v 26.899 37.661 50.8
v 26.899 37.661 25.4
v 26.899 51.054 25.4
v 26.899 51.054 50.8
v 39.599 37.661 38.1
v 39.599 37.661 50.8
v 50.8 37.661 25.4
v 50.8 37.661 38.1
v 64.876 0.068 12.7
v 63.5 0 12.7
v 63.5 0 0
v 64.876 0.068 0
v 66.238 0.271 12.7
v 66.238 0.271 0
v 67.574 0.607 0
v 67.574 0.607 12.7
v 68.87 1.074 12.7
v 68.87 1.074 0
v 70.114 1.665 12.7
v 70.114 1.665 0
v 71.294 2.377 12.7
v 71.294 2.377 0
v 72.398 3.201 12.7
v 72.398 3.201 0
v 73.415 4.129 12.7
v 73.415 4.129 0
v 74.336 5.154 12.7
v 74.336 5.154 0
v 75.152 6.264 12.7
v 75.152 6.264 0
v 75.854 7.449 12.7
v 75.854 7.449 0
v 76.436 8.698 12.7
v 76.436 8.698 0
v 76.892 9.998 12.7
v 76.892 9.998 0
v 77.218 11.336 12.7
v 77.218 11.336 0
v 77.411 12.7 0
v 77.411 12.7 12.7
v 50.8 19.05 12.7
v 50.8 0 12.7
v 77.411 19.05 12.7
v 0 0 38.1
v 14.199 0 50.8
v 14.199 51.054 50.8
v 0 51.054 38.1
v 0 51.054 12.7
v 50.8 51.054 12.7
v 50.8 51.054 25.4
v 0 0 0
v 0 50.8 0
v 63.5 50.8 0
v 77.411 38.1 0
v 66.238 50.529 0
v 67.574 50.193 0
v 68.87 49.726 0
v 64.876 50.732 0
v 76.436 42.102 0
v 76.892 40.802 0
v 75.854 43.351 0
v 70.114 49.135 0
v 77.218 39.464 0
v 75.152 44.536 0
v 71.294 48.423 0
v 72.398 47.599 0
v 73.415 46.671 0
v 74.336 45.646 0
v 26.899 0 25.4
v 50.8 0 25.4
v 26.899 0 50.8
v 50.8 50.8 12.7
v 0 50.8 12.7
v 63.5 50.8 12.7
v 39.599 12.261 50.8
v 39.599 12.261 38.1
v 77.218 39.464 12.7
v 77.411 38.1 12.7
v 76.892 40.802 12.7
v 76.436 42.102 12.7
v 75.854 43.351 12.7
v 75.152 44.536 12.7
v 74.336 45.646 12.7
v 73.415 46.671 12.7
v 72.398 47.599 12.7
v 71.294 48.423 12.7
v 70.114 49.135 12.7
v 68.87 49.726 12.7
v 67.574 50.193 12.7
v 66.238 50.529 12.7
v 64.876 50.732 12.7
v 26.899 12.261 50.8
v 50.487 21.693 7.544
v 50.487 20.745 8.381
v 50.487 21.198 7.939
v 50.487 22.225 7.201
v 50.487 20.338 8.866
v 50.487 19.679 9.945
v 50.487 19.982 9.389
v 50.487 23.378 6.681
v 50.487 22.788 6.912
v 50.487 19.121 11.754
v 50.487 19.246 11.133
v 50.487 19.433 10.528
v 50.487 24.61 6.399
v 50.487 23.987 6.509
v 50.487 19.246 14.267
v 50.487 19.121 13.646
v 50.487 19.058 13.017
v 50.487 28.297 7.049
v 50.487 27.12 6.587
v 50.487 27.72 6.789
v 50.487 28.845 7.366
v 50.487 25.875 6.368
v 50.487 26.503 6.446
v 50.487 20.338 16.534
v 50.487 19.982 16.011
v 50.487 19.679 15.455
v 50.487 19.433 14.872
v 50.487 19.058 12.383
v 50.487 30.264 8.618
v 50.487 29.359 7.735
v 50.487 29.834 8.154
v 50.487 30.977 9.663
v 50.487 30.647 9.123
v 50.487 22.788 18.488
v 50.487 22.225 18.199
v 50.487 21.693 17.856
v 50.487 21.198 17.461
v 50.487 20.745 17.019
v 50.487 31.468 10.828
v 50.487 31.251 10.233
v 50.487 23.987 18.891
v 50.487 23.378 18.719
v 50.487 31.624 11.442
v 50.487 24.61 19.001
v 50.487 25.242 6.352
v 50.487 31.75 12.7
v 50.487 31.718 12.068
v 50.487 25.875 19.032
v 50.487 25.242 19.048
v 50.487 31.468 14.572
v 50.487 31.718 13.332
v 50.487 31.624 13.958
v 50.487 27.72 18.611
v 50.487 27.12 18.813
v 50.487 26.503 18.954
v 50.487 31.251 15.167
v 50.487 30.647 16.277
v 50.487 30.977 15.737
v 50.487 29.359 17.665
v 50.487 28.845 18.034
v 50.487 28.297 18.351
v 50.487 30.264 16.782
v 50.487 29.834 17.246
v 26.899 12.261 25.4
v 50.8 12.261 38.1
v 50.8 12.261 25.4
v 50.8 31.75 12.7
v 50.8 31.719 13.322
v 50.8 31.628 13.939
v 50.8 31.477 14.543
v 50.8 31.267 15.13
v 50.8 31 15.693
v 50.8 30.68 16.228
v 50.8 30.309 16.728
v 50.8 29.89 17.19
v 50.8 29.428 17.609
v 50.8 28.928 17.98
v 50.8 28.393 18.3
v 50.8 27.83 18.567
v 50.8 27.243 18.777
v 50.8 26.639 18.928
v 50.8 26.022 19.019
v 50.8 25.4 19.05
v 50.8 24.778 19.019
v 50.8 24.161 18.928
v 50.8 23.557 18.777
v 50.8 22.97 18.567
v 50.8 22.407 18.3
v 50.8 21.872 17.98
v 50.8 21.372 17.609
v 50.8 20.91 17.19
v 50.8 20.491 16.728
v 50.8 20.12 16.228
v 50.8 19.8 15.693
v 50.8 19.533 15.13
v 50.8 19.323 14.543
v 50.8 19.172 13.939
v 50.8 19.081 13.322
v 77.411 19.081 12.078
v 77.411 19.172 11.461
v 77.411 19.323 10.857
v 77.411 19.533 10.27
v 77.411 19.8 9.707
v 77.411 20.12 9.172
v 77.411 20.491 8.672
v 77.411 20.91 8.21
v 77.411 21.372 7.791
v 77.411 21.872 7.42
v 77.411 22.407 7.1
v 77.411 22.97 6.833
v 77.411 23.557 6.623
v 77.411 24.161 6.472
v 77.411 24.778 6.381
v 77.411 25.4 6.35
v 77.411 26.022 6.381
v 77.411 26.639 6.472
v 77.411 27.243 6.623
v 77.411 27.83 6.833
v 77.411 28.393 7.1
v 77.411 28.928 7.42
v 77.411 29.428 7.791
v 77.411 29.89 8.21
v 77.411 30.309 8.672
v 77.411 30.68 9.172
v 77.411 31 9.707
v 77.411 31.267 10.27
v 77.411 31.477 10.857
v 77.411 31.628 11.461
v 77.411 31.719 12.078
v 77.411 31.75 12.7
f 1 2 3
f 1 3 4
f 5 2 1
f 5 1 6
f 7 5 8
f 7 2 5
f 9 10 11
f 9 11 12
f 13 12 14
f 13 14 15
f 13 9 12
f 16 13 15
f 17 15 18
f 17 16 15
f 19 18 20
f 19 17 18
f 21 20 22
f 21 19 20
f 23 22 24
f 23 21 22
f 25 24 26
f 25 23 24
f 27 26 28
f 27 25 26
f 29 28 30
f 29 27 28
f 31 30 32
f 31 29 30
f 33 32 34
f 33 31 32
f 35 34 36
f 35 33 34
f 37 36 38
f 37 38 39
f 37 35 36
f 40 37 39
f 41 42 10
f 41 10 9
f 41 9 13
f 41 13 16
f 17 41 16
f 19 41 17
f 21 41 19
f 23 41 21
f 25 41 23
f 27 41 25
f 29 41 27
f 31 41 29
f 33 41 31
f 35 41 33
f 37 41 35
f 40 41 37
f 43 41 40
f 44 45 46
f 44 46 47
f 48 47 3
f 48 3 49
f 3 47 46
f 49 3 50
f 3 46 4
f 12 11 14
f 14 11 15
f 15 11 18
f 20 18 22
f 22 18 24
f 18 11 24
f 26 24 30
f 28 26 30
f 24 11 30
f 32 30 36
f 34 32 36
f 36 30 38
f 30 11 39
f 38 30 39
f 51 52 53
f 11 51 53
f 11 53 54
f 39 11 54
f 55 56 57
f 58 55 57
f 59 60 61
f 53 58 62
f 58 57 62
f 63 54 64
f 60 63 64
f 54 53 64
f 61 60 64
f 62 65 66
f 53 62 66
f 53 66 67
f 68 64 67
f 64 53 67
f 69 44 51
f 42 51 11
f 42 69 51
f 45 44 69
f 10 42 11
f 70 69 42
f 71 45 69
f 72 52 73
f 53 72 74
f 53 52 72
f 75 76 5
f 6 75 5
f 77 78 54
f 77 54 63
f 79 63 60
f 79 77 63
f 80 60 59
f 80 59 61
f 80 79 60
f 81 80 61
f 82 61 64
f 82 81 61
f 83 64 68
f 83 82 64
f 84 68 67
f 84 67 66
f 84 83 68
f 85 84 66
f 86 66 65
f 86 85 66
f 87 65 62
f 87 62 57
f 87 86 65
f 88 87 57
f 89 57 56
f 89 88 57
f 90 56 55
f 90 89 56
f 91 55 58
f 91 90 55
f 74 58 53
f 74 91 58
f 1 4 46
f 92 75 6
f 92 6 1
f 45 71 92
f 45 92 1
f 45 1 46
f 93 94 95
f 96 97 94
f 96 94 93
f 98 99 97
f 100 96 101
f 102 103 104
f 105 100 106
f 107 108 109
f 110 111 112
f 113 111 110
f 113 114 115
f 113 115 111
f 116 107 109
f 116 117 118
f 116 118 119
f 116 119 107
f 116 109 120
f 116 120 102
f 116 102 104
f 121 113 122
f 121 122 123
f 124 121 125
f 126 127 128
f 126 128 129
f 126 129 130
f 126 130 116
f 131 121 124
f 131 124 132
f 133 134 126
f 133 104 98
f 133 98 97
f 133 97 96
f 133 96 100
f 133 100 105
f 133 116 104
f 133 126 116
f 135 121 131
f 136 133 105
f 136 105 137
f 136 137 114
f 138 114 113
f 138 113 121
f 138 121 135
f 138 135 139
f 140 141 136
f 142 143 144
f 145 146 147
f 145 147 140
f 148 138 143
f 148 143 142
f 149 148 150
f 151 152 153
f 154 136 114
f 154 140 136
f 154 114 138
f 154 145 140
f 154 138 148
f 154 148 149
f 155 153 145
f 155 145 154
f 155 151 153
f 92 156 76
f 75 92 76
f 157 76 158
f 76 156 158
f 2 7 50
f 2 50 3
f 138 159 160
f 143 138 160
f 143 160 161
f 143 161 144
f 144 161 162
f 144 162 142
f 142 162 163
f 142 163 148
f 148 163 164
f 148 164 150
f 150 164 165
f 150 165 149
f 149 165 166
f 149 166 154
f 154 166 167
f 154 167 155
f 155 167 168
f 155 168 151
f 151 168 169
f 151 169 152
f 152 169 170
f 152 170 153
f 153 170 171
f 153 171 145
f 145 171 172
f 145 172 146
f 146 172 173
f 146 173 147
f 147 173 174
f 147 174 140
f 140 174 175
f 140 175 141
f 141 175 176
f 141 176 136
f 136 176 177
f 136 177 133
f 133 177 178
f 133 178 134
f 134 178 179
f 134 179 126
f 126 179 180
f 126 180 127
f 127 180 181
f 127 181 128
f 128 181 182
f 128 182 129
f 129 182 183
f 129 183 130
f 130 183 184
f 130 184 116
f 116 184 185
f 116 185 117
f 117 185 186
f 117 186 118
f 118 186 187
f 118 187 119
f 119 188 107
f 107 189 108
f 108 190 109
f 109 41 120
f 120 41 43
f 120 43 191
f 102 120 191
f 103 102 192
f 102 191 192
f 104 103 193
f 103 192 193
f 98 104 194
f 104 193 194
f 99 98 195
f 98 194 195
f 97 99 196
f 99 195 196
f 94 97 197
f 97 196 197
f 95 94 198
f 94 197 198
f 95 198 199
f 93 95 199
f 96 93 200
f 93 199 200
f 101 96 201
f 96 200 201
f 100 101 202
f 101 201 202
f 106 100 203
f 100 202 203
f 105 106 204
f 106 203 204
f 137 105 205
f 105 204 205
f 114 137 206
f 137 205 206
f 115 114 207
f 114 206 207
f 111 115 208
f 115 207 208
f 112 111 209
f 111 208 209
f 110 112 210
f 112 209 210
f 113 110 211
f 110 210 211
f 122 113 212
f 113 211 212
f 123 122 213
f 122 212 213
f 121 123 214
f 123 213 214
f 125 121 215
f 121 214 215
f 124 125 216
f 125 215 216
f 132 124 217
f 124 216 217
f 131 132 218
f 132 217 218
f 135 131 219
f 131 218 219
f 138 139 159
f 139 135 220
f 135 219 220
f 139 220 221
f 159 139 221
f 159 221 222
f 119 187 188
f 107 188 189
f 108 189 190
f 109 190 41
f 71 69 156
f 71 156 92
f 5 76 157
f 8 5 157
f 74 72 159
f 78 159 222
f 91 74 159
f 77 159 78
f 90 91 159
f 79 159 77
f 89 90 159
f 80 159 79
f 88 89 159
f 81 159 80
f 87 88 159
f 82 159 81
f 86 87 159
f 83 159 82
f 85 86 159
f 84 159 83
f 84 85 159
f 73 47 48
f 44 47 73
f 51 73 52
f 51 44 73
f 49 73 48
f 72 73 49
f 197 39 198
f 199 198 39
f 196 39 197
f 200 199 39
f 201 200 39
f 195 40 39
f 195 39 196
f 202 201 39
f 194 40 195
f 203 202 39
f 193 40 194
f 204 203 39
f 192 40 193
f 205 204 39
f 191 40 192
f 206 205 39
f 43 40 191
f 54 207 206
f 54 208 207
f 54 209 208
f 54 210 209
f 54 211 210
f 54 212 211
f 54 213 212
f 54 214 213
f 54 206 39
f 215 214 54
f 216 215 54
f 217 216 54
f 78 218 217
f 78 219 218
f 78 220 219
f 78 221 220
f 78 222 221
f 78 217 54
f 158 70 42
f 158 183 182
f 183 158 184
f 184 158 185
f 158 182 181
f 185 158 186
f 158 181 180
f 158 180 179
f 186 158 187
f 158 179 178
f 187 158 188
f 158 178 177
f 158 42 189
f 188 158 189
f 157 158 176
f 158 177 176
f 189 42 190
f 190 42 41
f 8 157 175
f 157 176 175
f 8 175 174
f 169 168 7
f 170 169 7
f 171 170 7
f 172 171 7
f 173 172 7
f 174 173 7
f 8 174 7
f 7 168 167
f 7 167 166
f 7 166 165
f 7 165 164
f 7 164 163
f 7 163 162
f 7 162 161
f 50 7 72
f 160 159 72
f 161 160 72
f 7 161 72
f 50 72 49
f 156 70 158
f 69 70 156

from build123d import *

# Parameters (mm, degrees)
F0_W      = 63.5
F0_H      = 50.8
F1_DEPTH  = 12.7
F3_DEPTH  = 12.7
F5_DEPTH  = 51.054
F6_W      = 12.7
F6_H      = 25.4
F7_DEPTH  = 25.4
F8_W      = 11.2009683429
F8_H      = 25.4
F9_DEPTH  = 12.7
F10_R     = 6.35
F11_DEPTH = 26.924


with BuildPart() as f1:
    # F0 (on Top) → F1 (new body)
    with BuildSketch(Plane.XY):
        with Locations((31.75, 25.4)):
            Rectangle(F0_W, F0_H)
    extrude(amount=F1_DEPTH)

    # F2 (on face) → F3 (join)
    with BuildSketch(Plane.XY.offset(12.7)):
        with BuildLine():
            Line((77.4110166286, 12.7), (77.4110166286, 38.1))
            ThreePointArc((77.4110166286, 38.1), (72.918152468, 47.1474711632), (63.5, 50.8))
            Line((63.5, 50.8), (63.5, 0))
            ThreePointArc((63.5, 0), (72.918152468, 3.6525288368), (77.4110166286, 12.7))
        make_face()
    extrude(amount=-F3_DEPTH)

    # F4 (on face) → F5 (join)
    with BuildSketch(Plane.XZ):
        Polygon((0, 38.1), (0, 12.7), (50.8, 12.7), (50.8, 25.4), (26.8990316571, 25.4), (26.8990316571, 50.8), (14.1990316571, 50.8), align=None)
    extrude(amount=-F5_DEPTH)

    # F6 (on face) → F7 (join)
    with BuildSketch(Plane.XY.offset(25.4)):
        with Locations((33.2490316571, 24.9606130317)):
            Rectangle(F6_W, F6_H)
    extrude(amount=F7_DEPTH)

    # F8 (on face) → F9 (join)
    with BuildSketch(Plane.XY.offset(25.4)):
        with Locations((45.1995158286, 24.9606130317)):
            Rectangle(F8_W, F8_H)
    extrude(amount=F9_DEPTH)

    # F10 (on face) → F11 (cut)
    with BuildSketch(Plane.YZ.offset(77.4110166286)):
        with Locations((25.4, 12.7)):
            Circle(F10_R)
    extrude(amount=-F11_DEPTH, mode=Mode.SUBTRACT)


solid = f1.part
